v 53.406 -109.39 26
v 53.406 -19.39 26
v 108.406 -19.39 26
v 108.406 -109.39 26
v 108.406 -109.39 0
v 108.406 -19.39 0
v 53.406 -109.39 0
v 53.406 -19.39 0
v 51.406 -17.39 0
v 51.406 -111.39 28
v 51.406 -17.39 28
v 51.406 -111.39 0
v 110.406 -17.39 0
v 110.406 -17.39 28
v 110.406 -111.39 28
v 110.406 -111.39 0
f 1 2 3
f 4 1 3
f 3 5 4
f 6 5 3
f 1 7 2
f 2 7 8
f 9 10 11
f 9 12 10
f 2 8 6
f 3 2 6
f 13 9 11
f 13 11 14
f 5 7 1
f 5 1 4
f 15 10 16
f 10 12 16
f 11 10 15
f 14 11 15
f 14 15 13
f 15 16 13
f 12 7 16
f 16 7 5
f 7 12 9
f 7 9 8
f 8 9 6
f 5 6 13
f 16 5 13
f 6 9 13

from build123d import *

# Parameters (mm, degrees)
SKETCH1_W           = 59
SKETCH1_H           = 94
SKETCH1_W_2         = 55
SKETCH1_H_2         = 90
EXTRUDE_THIN1_DEPTH = 26
SKETCH2_W           = 59
SKETCH2_H           = 94
BOSS_EXTRUDE1_DEPTH = 2


with BuildPart() as part:
    # Sketch1 → Extrude-Thin1 (new body)
    with BuildSketch(Plane.XY):
        with Locations((80.9055, -64.39)):
            Rectangle(SKETCH1_W, SKETCH1_H)
        with Locations((80.9055, -64.39)):
            Rectangle(SKETCH1_W_2, SKETCH1_H_2, mode=Mode.SUBTRACT)
    extrude(amount=EXTRUDE_THIN1_DEPTH)

    # Sketch2 → Boss-Extrude1 (add)
    with BuildSketch(Plane.XY.offset(26)):
        with Locations((80.9055, -64.39)):
            Rectangle(SKETCH2_W, SKETCH2_H)
    extrude(amount=BOSS_EXTRUDE1_DEPTH)


solid = part.part
